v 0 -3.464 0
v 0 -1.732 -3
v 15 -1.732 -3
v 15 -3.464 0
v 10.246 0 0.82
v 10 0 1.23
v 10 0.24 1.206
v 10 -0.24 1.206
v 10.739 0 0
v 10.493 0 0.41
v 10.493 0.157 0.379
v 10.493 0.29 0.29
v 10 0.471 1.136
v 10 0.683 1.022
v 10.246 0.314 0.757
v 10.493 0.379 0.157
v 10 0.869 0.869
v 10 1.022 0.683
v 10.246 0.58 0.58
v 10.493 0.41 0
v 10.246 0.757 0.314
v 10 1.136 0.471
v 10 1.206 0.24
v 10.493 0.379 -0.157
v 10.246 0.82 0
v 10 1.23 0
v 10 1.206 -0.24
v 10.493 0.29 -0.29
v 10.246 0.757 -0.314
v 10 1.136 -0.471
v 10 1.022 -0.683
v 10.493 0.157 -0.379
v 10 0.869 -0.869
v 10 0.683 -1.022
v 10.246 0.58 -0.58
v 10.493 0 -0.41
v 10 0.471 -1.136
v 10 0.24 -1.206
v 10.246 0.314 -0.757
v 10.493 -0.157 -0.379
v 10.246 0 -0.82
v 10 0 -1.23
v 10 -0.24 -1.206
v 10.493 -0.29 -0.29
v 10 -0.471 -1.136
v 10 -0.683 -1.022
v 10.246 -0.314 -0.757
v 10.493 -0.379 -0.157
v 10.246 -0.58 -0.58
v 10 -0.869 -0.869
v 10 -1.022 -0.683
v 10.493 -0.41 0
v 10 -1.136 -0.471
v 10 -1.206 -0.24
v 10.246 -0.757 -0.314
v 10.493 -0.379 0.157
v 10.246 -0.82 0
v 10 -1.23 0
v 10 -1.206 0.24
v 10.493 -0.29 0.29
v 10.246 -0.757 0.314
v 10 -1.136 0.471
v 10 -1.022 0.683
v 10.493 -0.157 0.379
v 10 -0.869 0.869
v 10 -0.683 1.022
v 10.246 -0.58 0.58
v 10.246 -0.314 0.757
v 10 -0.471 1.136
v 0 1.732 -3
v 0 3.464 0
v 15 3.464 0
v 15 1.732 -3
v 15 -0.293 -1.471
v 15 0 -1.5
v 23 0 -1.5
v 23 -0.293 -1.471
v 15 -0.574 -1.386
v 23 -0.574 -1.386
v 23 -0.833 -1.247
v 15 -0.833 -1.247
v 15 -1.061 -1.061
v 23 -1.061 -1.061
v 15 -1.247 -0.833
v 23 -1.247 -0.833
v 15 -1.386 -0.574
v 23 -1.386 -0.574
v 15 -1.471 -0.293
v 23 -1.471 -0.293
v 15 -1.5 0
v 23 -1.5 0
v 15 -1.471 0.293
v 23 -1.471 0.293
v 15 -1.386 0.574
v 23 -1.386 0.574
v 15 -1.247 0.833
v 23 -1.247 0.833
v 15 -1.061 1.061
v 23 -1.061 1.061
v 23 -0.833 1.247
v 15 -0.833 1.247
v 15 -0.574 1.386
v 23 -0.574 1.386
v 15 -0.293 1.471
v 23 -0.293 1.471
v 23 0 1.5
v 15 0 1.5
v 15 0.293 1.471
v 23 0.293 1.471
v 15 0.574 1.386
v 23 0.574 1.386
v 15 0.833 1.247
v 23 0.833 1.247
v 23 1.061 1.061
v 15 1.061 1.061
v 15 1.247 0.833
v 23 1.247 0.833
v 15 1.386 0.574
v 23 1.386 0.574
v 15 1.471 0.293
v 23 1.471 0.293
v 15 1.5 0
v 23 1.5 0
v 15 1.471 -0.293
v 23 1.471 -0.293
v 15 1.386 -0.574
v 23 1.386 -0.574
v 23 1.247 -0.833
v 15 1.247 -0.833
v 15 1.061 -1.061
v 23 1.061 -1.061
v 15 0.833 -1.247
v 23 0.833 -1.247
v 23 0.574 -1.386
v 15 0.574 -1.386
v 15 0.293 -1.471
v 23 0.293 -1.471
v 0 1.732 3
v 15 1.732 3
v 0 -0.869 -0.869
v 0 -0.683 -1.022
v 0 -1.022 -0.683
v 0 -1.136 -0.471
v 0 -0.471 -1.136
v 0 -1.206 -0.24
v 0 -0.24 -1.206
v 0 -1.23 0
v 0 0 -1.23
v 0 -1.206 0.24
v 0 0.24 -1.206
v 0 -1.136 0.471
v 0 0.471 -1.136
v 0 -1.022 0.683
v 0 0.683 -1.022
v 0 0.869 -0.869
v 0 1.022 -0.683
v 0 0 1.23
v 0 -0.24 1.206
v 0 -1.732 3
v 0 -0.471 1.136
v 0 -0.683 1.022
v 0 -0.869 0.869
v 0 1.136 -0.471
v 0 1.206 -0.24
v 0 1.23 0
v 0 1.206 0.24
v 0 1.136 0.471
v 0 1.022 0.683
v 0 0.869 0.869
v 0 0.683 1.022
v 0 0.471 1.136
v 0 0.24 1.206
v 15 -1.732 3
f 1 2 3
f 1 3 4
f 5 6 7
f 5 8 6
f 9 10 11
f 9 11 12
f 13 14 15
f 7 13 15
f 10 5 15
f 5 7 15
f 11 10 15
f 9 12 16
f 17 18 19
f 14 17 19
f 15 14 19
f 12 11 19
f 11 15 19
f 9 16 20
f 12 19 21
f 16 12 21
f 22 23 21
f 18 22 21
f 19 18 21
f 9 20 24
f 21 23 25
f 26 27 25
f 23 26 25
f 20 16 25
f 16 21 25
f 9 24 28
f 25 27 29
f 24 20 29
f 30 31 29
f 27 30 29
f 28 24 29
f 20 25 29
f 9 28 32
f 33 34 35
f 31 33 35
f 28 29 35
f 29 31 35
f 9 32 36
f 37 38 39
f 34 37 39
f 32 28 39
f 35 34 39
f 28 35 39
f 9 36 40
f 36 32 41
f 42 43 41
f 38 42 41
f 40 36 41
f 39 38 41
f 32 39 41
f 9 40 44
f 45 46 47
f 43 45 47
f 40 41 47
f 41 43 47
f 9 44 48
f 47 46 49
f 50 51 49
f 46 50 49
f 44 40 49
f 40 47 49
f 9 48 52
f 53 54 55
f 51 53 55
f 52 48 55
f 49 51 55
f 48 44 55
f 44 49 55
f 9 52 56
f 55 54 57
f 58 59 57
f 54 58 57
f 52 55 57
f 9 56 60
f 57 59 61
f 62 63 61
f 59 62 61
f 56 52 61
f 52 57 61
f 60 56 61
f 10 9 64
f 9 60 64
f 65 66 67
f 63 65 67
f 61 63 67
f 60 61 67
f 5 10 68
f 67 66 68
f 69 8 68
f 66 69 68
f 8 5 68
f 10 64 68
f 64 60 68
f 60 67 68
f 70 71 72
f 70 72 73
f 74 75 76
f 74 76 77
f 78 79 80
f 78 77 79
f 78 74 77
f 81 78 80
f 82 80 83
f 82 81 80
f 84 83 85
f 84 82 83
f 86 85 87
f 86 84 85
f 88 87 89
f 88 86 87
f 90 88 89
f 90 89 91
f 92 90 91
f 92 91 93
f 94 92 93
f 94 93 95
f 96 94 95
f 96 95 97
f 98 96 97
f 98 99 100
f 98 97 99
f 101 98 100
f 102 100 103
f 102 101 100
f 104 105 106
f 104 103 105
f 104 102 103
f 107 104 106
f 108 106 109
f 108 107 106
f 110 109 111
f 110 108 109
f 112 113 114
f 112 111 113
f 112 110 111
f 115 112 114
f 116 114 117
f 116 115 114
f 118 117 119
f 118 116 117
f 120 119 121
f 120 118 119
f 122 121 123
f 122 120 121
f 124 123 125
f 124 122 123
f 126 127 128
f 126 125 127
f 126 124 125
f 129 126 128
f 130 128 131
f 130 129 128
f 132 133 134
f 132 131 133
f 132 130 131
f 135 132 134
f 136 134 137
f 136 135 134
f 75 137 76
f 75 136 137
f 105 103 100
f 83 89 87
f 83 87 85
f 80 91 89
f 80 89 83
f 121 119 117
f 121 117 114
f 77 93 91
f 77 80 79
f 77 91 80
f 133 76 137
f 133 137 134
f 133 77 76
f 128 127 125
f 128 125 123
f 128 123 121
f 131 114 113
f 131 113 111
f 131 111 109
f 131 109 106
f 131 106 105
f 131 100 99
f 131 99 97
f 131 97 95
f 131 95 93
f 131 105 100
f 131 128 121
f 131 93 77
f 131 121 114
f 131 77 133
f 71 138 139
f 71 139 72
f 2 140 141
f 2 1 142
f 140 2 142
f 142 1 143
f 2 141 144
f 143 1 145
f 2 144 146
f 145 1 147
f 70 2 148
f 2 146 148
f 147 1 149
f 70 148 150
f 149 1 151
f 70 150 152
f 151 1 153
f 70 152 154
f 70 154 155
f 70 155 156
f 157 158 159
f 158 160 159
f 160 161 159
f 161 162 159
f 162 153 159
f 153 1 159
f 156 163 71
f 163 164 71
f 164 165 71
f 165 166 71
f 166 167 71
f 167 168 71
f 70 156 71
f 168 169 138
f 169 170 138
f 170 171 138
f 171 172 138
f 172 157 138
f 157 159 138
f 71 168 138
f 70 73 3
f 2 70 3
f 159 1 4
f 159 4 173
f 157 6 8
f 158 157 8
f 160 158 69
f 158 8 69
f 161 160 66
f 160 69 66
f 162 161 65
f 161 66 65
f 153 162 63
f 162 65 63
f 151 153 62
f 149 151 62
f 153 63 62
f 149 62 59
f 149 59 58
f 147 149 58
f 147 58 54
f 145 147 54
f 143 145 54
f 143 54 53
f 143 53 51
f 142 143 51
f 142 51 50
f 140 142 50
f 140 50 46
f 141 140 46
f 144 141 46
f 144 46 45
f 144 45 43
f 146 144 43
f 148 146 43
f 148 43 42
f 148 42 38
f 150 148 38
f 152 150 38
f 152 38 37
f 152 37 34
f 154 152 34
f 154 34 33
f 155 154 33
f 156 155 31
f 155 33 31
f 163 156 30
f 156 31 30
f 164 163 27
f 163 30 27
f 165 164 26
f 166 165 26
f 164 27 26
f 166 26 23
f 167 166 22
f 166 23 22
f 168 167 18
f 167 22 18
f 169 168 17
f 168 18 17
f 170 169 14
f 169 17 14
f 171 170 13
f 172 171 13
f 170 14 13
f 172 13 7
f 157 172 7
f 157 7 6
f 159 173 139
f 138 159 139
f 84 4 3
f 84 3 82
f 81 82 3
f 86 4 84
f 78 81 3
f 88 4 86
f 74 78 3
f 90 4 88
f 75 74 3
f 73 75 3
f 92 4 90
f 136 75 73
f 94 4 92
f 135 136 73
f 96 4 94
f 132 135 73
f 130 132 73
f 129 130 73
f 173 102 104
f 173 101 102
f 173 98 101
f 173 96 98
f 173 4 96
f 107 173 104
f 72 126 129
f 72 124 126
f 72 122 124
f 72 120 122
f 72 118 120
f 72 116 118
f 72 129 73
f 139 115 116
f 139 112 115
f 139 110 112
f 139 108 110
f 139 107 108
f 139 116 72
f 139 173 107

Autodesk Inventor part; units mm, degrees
ref_plane "YZ Plane" through (0, 0, 0) normal (1, 0, 0) x (0, 1, 0)
ref_plane "XZ Plane" through (0, 0, 0) normal (0, 1, 0) x (-1, 0, 0)
ref_plane "XY Plane" through (0, 0, 0) normal (0, 0, 1) x (1, 0, 0)
sketch "スケッチ1" plane through (0, 0, 0) normal (1, 0, 0) x (0, 1, 0)
  line L0 (1.7321, -3) -> (-1.7321, -3)
  line L1 (-1.7321, -3) -> (-3.4641, 0)
  line L2 (-3.4641, 0) -> (-1.7321, 3)
  line L3 (-1.7321, 3) -> (1.7321, 3)
  line L4 (1.7321, 3) -> (3.4641, 0)
  line L5 (3.4641, 0) -> (1.7321, -3)
  point P0 (0, 0)
  point P1 (0, 0)
  dimension "d0" = 6
extrude "押し出し1" add sketch "スケッチ1" along normal blind 15
sketch "スケッチ2" plane through (15, 0, 0) normal (1, 0, 0) x (0, 0, -1)
  circle A0 centre (0, 0) radius 1.5
  dimension "d3" = 3
extrude "押し出し2" add sketch "スケッチ2" along normal blind 8
thread "ねじ1" size "M3x0.5" class "6g" standard "ANSI Metric M Profile" full length
sketch "スケッチ3" plane through (0, 0, 0) normal (-1, 0, 0) x (0, 0, 1)
  point P0 (0, 0)
  point P1 (0, 0)
hole "穴1" at (0, 0, 0) direction (1, 0, 0) diameter 2.459 depth 10 tip angle 118 thread size "M3x0.5" class "6H" standard "ISO Metric profile"
properties part number "Spacer_M3_L15" material "鋼、合金"
